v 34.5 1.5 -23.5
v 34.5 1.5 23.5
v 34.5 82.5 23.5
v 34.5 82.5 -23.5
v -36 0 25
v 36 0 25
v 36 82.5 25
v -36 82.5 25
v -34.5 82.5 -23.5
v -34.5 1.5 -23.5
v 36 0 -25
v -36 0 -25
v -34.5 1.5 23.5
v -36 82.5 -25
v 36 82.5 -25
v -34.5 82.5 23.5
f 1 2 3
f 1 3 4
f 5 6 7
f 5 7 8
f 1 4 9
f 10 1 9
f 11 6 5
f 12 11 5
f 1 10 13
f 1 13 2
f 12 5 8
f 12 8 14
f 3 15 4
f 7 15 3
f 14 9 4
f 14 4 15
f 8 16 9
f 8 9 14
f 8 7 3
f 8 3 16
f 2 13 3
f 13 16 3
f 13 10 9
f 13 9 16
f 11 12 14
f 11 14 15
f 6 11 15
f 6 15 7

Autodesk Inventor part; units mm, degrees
ref_plane "YZ Plane" through (0, 0, 0) normal (1, 0, 0) x (0, 1, 0)
ref_plane "XZ Plane" through (0, 0, 0) normal (0, 1, 0) x (-1, 0, 0)
ref_plane "XY Plane" through (0, 0, 0) normal (0, 0, 1) x (1, 0, 0)
sketch "Boceto3" plane through (0, 0, 0) normal (0, 1, 0) x (-1, 0, 0)
  line L0 (36, -25) -> (-36, -25)
  line L1 (-36, -25) -> (-36, 25)
  line L2 (-36, 25) -> (36, 25)
  line L3 (36, 25) -> (36, -25)
  point P0 (0, 0)
  point P1 (36, 0)
  point P2 (0, -25)
  dimension "d8" = 72
  dimension "d9" = 50
extrude "Extrusión2" add sketch "Boceto3" along normal blind 82.5
sketch "Boceto5" plane through (0, 82.5, 0) normal (0, 1, 0) x (1, 0, 0)
  line L0 (-34.5, -23.5) -> (34.5, -23.5)
  line L1 (34.5, -23.5) -> (34.5, 23.5)
  line L2 (34.5, 23.5) -> (-34.5, 23.5)
  line L3 (-34.5, 23.5) -> (-34.5, -23.5)
  line L4 (-36, 25) -> (-36, -25) projected
  line L5 (36, 25) -> (-36, 25) projected
  line L6 (36, -25) -> (36, 25) projected
  line L7 (-36, -25) -> (36, -25) projected
  point P0 (0, 0)
  dimension "d12" = 1.5
  dimension "d13" = 1.5
  dimension "d14" = 1.5
  dimension "d15" = 1.5
extrude "Extrusión3" cut sketch "Boceto5" against normal blind 81 contours L3 L2 L1 L0
properties part number "Caja1_SinOrificios"
